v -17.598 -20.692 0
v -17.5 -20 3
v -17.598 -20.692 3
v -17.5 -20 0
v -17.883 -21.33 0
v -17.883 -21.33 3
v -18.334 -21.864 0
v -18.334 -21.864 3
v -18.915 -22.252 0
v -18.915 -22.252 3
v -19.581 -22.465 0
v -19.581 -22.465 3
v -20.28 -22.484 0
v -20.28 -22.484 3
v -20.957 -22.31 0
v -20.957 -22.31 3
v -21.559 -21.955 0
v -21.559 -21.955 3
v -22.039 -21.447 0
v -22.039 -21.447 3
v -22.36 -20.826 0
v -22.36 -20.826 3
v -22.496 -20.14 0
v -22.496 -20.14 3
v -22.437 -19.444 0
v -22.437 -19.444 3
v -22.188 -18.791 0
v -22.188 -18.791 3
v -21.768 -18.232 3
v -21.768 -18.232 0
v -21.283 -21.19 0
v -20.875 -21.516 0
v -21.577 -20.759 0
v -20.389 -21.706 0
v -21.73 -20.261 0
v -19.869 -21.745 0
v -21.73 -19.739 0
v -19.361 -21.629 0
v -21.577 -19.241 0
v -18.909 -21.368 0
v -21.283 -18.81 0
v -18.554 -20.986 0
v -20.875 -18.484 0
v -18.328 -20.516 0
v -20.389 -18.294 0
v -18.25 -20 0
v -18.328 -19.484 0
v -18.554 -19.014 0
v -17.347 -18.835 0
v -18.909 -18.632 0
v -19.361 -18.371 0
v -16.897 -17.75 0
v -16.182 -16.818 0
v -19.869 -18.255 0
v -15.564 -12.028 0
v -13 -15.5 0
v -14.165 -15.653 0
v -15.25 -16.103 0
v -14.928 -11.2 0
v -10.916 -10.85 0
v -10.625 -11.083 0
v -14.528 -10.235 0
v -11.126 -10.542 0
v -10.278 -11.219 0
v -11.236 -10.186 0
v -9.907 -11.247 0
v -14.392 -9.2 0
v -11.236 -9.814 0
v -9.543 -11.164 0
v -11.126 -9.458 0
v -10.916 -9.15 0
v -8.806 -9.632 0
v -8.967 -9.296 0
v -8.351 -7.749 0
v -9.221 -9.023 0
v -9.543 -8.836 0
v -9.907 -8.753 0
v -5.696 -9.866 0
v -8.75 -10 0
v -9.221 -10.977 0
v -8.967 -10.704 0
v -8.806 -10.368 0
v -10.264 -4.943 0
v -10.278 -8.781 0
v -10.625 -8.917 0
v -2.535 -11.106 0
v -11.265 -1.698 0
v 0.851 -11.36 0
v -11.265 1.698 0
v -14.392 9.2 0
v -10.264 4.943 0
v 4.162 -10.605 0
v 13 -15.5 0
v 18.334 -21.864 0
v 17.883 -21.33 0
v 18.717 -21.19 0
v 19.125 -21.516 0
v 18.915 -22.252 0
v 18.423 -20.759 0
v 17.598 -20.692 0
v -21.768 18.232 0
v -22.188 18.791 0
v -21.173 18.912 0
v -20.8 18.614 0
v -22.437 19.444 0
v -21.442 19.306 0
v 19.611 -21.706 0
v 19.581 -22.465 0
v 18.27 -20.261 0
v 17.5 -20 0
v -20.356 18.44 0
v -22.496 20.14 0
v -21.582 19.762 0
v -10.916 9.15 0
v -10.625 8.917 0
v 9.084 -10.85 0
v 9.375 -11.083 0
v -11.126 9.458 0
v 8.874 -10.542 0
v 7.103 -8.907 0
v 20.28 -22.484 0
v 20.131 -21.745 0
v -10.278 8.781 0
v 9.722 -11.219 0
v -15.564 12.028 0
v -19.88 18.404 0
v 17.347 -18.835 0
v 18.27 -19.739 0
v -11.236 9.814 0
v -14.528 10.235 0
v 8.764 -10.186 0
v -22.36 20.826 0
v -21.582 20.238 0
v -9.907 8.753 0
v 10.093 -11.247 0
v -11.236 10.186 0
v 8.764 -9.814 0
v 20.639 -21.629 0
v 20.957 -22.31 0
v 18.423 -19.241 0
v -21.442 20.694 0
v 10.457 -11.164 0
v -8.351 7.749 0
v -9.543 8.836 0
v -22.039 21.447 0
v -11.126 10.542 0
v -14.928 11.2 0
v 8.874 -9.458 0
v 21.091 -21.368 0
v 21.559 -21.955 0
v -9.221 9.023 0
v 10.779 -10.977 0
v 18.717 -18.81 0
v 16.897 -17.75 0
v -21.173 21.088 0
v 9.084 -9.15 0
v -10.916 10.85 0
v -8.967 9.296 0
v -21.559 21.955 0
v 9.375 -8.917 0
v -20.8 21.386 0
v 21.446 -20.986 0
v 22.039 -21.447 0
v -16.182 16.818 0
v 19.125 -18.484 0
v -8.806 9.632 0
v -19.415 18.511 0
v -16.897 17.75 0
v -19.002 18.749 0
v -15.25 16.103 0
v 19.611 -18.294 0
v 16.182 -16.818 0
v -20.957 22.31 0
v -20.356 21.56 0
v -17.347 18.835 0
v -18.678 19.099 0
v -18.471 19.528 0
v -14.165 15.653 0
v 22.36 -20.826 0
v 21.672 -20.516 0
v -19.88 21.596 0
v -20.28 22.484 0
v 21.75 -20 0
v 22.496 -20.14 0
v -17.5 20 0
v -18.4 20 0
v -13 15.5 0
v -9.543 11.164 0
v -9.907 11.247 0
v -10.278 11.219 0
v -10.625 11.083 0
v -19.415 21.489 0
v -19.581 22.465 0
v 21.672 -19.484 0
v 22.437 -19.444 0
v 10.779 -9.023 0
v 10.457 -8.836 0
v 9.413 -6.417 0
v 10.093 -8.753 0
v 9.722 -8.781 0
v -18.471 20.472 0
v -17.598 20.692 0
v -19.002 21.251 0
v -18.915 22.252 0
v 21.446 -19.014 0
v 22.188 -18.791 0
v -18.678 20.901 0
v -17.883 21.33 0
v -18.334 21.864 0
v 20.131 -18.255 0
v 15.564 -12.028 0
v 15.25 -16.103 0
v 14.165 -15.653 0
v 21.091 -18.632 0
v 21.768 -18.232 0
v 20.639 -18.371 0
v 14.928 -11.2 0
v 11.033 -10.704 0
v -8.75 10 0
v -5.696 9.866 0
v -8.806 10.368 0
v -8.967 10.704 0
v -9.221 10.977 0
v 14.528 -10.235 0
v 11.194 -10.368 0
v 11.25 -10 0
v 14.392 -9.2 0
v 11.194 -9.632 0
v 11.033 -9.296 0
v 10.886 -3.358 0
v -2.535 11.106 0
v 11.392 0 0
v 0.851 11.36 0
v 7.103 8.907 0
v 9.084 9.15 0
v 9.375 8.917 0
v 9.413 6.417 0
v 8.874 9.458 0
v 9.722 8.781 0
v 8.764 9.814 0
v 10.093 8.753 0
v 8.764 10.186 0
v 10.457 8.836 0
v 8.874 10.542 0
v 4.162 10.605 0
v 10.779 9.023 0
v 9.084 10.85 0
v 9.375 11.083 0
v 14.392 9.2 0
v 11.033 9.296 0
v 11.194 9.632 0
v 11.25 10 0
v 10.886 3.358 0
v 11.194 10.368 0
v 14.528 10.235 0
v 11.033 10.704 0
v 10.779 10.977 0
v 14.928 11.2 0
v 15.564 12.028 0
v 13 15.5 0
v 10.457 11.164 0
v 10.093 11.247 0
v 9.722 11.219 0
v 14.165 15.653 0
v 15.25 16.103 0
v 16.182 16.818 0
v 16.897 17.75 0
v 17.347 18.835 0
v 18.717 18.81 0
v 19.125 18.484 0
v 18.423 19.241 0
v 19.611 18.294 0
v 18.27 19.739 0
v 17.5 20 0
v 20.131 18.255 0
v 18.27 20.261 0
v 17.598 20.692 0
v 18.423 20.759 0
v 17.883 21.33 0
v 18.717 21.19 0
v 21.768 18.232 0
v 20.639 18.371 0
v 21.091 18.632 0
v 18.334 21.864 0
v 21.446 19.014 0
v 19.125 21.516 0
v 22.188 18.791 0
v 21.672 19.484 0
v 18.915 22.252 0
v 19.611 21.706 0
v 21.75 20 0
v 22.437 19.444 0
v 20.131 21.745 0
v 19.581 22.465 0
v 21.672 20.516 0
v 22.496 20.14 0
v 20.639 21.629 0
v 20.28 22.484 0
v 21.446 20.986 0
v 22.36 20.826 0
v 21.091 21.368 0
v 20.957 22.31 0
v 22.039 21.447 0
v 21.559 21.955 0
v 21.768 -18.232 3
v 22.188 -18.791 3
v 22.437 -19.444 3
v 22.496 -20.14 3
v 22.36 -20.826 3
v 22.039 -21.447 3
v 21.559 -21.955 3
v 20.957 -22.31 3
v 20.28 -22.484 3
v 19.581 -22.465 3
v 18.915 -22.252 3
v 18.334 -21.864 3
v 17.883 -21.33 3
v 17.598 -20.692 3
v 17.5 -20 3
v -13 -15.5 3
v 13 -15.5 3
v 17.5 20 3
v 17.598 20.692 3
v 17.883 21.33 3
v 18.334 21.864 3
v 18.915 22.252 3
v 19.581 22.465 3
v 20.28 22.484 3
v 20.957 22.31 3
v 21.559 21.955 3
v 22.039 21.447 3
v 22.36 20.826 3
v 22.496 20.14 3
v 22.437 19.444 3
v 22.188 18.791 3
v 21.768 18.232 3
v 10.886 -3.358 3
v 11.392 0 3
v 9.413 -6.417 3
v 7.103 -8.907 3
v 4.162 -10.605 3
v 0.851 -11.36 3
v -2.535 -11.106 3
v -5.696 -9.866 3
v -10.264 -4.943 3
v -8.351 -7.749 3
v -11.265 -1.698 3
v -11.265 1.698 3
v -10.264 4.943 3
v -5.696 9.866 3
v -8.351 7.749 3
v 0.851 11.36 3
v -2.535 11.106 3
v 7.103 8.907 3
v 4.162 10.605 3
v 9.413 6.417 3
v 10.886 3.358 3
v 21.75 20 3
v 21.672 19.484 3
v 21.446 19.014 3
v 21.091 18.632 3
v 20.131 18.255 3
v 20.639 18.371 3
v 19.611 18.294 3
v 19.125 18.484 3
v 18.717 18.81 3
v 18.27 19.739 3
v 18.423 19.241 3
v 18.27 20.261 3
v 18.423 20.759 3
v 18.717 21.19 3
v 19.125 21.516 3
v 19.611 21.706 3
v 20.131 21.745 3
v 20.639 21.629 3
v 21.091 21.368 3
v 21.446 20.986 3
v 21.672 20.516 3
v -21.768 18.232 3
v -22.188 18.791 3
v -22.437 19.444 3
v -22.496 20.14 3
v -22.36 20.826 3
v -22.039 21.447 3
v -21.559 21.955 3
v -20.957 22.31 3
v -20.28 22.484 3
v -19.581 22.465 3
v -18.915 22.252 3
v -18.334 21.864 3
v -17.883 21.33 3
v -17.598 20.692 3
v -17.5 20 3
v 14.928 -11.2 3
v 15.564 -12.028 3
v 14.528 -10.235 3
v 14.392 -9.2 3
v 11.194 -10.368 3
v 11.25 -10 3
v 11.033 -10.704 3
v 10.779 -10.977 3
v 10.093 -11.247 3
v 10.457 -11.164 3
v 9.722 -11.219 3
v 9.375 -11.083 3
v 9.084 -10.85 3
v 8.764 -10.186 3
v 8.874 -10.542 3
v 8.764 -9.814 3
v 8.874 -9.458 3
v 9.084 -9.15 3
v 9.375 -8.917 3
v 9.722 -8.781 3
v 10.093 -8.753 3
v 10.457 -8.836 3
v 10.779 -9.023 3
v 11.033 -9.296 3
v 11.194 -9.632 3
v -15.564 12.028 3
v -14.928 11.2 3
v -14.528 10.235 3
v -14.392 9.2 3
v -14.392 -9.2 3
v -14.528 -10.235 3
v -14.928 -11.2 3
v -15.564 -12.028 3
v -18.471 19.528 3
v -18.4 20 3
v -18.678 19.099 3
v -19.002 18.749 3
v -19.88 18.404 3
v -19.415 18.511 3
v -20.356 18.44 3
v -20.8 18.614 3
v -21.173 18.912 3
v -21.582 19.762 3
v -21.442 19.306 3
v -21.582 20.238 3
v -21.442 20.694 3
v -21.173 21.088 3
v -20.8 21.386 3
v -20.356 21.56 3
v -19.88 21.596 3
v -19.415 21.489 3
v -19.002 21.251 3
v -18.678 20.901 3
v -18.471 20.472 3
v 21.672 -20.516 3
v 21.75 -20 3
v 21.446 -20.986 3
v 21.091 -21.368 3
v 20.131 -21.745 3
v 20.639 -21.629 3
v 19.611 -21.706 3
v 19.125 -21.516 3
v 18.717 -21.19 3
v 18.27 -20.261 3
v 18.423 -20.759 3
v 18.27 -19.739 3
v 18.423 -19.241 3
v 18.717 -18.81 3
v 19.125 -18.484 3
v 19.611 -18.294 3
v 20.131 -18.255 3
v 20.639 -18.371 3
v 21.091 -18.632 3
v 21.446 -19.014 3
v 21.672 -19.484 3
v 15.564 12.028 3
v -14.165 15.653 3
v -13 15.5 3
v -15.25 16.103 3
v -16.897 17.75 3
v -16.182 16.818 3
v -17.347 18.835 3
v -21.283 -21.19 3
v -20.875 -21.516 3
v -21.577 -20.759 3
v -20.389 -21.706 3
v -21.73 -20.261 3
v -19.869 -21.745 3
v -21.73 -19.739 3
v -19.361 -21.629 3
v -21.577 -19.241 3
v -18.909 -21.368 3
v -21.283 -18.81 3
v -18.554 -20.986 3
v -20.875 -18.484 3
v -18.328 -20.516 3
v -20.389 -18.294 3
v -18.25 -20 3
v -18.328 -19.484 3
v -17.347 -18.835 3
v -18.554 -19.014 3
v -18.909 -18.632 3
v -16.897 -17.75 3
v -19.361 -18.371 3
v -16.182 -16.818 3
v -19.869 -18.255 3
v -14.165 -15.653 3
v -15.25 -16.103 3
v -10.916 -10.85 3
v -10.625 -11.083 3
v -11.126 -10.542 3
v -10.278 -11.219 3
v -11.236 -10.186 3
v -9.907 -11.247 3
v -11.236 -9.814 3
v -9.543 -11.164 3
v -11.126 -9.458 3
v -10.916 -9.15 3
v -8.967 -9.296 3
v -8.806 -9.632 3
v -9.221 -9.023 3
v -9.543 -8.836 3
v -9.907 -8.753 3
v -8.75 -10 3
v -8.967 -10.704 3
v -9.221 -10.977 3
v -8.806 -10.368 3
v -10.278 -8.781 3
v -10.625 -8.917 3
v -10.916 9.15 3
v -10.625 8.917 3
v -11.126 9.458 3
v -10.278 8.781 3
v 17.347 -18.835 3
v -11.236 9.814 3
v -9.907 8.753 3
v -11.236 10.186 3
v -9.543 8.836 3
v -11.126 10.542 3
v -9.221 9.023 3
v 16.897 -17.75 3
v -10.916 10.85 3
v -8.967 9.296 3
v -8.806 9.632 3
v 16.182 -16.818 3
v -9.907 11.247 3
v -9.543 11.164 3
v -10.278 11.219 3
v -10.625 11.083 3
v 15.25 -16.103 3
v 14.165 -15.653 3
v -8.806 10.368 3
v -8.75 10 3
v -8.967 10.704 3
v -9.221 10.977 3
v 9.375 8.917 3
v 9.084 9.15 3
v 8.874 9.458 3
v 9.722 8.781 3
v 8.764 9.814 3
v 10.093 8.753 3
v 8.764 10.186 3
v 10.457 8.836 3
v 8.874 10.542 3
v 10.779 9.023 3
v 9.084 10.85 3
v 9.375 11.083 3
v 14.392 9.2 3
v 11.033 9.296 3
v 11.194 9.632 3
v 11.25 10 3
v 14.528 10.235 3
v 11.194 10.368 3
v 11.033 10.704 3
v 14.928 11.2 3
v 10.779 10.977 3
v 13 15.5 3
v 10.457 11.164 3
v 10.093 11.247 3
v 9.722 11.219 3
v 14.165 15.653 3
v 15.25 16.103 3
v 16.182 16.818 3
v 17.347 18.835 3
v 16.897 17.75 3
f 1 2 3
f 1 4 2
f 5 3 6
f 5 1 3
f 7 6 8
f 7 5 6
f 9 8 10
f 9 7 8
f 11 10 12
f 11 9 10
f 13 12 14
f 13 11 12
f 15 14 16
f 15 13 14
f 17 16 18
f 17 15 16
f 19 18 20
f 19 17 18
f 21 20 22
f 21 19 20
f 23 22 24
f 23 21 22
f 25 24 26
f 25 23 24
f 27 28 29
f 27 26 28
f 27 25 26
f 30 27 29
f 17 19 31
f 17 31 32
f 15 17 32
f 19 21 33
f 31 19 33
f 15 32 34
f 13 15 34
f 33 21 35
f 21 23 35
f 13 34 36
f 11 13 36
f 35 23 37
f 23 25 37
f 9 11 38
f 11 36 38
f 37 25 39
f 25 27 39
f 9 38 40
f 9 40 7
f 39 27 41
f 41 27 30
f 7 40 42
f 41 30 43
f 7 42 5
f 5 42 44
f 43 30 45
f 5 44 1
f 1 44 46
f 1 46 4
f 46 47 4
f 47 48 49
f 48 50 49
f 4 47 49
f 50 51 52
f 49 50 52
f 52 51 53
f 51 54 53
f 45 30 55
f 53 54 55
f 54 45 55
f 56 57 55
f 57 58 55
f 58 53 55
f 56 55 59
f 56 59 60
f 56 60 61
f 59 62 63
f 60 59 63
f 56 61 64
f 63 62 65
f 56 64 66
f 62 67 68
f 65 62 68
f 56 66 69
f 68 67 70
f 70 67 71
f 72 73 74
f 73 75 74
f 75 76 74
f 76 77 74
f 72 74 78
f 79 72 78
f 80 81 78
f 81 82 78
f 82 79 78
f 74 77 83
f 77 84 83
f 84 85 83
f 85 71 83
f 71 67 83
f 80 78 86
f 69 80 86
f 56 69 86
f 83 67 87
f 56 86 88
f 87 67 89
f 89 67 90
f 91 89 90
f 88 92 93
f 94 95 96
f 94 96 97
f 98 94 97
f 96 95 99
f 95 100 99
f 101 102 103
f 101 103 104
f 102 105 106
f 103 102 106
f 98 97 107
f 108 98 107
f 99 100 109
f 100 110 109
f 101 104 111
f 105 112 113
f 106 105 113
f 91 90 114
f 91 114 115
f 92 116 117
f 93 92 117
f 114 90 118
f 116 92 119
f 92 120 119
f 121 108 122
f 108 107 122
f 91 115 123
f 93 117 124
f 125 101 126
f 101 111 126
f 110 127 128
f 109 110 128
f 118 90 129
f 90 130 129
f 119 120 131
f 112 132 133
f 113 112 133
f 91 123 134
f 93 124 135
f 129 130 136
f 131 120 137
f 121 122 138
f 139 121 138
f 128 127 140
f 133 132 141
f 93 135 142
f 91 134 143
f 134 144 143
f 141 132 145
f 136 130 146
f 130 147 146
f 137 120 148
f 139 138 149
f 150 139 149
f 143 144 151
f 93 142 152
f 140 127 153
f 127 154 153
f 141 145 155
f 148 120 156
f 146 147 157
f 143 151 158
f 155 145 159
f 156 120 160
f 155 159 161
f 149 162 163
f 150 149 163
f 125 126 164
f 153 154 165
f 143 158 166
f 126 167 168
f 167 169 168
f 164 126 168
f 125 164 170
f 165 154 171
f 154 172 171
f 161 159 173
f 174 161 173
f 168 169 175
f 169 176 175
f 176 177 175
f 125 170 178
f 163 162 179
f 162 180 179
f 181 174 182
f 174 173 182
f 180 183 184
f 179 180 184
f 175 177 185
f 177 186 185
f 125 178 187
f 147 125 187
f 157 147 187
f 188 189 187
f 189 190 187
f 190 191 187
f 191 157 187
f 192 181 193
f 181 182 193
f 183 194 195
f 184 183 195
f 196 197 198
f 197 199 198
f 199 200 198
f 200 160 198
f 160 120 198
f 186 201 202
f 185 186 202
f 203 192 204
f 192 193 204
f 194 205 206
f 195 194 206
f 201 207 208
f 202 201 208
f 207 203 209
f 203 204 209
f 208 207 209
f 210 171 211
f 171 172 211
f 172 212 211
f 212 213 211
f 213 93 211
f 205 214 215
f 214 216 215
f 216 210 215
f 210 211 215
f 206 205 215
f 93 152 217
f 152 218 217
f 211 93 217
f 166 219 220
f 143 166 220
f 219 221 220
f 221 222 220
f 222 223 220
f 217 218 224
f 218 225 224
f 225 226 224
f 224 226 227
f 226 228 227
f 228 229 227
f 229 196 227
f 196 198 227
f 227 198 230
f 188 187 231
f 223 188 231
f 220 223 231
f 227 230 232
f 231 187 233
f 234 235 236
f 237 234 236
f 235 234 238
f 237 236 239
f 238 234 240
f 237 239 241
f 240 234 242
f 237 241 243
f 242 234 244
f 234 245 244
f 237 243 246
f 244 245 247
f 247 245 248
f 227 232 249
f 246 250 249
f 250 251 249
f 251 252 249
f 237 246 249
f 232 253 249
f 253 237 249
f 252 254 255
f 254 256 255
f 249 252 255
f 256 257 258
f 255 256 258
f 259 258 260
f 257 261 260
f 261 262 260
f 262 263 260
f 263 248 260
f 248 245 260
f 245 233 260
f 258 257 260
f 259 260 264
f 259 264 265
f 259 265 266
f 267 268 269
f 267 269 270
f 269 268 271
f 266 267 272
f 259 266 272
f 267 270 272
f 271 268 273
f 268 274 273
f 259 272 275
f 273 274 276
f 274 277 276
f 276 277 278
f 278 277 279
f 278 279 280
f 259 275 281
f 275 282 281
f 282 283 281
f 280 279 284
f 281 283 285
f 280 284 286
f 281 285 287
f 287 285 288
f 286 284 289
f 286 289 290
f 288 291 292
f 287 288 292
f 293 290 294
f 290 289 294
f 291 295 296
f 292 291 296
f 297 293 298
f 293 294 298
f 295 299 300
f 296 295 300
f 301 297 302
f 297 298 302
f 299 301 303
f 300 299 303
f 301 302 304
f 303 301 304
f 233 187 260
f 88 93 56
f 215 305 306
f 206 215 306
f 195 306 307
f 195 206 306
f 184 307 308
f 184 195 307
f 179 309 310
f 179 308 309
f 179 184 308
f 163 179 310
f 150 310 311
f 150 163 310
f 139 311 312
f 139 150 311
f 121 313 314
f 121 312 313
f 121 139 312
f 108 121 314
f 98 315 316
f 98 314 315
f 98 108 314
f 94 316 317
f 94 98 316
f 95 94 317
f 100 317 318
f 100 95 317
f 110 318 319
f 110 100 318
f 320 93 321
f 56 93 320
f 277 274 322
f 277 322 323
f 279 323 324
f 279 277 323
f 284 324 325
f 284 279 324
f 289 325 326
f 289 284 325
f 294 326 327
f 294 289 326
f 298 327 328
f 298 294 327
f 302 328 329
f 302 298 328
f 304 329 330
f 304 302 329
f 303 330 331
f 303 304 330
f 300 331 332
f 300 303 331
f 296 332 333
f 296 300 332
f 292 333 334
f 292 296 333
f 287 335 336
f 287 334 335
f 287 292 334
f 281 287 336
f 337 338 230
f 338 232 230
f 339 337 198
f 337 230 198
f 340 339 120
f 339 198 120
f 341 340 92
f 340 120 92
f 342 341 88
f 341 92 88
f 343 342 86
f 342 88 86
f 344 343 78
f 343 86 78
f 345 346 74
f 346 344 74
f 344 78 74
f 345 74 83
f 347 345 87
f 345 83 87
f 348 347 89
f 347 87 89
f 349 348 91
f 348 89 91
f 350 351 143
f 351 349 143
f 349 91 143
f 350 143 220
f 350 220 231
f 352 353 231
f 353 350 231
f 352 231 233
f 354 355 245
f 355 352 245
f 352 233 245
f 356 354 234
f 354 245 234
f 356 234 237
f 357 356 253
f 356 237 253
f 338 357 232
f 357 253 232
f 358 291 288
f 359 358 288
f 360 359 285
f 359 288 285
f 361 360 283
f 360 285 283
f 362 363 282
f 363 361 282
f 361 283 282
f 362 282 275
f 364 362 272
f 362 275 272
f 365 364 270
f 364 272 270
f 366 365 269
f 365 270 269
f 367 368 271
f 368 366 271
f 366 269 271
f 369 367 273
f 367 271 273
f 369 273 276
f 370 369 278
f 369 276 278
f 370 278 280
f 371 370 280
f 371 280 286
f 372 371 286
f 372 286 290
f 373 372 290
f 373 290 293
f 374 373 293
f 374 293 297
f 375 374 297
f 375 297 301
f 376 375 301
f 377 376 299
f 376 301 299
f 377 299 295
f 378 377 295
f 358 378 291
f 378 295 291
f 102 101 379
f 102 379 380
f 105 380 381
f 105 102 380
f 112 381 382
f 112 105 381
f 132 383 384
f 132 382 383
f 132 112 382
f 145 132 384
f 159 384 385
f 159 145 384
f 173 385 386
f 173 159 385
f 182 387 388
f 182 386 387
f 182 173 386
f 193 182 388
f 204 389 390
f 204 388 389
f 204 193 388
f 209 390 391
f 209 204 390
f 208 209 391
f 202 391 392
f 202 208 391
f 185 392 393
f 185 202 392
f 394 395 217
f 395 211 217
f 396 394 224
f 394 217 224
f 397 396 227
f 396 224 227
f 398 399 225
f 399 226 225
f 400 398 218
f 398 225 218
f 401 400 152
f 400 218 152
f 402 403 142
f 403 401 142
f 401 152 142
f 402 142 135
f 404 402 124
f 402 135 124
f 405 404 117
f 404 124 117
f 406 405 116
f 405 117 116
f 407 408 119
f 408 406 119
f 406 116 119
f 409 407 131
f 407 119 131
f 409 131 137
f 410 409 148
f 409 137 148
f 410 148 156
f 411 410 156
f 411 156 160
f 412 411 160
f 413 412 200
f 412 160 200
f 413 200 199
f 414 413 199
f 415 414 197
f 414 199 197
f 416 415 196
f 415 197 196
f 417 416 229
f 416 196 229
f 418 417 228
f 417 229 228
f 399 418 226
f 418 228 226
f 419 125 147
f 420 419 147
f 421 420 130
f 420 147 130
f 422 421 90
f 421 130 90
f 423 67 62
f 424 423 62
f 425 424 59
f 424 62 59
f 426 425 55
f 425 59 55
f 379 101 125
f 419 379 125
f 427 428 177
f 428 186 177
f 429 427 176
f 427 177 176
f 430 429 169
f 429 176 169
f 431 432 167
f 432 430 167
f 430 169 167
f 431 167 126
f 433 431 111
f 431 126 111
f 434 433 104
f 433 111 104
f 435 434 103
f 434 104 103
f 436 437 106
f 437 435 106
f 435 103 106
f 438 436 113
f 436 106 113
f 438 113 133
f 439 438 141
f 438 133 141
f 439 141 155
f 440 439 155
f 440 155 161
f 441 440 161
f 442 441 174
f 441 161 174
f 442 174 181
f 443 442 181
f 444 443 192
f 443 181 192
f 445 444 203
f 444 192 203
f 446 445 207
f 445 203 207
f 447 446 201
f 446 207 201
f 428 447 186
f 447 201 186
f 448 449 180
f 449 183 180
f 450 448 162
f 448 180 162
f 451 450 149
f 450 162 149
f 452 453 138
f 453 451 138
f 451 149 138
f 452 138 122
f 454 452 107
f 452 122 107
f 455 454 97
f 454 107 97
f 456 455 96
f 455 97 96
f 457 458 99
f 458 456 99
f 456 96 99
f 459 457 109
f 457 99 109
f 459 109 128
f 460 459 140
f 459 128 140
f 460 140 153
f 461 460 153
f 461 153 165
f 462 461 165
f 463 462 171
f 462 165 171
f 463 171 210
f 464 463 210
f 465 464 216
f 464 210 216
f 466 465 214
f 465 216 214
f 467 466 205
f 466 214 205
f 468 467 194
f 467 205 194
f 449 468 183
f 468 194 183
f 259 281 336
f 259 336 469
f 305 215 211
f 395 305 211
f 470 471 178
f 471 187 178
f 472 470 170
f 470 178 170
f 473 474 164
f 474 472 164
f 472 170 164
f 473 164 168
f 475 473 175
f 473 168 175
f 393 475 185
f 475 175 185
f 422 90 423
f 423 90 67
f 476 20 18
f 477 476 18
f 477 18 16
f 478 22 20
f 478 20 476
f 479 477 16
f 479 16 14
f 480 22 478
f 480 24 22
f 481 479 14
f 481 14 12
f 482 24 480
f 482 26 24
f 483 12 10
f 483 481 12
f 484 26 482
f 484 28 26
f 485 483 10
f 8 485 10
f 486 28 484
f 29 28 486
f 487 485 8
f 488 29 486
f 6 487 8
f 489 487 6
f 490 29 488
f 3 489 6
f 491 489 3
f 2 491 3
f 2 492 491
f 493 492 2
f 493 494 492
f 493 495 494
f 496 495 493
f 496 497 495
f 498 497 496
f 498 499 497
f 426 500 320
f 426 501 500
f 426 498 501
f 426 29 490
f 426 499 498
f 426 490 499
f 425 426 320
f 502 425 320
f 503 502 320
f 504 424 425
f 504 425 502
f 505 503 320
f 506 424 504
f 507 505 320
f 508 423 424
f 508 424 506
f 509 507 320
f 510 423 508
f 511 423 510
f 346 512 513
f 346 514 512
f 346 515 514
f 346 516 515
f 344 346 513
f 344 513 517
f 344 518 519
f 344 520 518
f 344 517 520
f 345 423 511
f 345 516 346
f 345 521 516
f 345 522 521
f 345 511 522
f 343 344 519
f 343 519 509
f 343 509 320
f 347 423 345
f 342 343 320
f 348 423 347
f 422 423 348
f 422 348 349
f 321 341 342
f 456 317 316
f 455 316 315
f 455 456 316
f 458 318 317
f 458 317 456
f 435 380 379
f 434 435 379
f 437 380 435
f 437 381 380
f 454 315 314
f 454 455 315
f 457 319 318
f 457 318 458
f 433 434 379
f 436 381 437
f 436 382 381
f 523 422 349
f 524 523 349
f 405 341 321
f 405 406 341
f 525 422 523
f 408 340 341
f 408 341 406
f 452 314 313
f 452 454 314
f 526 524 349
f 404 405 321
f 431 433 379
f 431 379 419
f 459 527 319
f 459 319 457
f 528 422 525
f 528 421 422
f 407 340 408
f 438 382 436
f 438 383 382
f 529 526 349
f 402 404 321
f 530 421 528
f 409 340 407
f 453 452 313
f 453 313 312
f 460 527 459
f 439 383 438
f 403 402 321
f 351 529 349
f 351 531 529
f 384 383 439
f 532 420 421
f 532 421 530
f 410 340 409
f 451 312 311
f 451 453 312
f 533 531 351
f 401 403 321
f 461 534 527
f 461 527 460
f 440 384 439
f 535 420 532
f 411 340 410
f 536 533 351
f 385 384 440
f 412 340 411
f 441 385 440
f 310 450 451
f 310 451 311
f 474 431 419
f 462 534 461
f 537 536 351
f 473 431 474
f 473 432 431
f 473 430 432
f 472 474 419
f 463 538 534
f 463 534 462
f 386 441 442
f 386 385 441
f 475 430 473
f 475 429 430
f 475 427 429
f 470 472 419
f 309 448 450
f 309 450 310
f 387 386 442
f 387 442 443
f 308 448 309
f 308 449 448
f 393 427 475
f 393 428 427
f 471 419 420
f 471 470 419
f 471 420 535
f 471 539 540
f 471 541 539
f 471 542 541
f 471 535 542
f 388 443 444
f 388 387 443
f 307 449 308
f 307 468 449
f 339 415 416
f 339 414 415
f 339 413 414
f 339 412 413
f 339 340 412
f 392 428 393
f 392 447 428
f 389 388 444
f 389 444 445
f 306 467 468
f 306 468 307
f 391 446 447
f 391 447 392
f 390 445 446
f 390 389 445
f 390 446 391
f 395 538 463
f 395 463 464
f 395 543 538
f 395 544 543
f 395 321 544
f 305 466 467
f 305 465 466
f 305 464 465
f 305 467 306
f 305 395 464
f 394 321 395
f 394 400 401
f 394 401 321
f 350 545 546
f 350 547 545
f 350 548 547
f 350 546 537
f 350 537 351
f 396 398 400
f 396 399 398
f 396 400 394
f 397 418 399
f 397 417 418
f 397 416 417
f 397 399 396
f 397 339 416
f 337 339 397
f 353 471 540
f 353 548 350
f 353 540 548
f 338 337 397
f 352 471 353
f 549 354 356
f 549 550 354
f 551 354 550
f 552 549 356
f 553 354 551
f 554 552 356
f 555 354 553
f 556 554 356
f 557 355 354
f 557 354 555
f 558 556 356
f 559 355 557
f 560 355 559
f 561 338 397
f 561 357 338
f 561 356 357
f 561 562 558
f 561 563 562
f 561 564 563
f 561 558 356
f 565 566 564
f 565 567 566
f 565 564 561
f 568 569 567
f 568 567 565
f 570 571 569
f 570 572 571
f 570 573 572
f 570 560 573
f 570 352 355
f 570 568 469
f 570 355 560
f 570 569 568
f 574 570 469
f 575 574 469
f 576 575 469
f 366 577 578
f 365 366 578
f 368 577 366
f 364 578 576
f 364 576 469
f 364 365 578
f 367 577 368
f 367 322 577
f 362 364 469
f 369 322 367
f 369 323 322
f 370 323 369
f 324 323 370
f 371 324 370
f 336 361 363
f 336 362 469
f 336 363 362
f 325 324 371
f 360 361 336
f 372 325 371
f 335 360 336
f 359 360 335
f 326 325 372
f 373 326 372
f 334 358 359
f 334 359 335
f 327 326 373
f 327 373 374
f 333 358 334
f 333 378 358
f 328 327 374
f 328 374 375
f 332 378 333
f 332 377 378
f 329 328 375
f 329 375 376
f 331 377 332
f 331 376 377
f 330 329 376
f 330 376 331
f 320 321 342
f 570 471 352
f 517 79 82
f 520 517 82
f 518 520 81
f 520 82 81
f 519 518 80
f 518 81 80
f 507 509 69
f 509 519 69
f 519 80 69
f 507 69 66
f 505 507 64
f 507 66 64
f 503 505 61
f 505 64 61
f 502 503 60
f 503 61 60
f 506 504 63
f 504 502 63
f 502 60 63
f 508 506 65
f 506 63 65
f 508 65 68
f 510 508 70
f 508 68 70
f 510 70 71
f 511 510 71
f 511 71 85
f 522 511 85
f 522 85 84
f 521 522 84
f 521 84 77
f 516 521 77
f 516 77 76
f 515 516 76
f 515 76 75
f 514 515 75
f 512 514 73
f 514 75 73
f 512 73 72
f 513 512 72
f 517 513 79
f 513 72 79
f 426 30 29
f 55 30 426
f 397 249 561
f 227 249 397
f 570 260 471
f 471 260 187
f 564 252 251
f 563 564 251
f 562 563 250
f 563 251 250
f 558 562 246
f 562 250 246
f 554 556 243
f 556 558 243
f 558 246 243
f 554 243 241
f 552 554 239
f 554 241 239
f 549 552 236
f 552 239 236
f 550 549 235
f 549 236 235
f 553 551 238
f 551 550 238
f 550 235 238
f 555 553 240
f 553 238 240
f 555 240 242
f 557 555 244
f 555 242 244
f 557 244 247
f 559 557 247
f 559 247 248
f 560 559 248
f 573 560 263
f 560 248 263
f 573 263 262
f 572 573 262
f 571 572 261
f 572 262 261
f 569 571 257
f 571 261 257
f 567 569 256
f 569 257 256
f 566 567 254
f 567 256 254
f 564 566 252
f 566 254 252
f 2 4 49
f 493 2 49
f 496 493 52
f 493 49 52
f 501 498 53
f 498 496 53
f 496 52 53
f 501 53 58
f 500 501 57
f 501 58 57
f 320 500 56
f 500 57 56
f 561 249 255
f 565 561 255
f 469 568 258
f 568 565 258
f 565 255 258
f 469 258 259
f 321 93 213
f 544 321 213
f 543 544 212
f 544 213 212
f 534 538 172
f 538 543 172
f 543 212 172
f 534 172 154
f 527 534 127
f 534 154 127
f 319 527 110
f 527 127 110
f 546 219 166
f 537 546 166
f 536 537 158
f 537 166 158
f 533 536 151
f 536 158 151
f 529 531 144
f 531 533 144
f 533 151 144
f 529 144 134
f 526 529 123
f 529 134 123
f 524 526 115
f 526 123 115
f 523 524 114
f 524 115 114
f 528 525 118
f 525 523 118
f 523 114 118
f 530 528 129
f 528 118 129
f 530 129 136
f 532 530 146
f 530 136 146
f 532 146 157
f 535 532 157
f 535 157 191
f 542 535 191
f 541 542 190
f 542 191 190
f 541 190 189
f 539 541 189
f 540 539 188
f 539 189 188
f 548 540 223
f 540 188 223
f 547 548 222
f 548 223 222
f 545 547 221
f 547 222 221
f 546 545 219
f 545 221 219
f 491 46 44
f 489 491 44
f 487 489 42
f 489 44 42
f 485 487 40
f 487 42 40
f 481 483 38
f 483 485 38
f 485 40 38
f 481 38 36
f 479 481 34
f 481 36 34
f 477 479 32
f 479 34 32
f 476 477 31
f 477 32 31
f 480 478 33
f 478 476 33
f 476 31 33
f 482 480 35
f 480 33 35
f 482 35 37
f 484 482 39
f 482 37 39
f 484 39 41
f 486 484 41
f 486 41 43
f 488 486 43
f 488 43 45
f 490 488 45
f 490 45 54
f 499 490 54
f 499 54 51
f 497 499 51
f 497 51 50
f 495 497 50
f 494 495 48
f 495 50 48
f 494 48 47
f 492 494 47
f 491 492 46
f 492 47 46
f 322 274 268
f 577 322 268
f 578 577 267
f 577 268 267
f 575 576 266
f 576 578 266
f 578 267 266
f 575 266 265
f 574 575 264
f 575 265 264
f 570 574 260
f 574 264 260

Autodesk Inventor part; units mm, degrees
ref_plane "YZ Plane" through (0, 0, 0) normal (1, 0, 0) x (0, 1, 0)
ref_plane "XZ Plane" through (0, 0, 0) normal (0, 1, 0) x (-1, 0, 0)
ref_plane "XY Plane" through (0, 0, 0) normal (0, 0, 1) x (1, 0, 0)
sketch "スケッチ1" plane through (0, 0, 0) normal (0, 0, 1) x (1, 0, 0)
  line L0 (10, -10) -> (-10, -10) construction
  line L1 (-10, -10) -> (-10, 10) construction
  line L2 (-10, 10) -> (10, 10) construction
  line L3 (10, 10) -> (10, -10) construction
  line L4 (10, -10) -> (-10, 10) construction
  line L5 (-10, -10) -> (10, 10) construction
  line L6 (12.5, -12.5) -> (-12.5, -12.5) construction
  line L7 (-12.5, -12.5) -> (-12.5, 12.5) construction
  line L8 (-12.5, 12.5) -> (12.5, 12.5) construction
  line L9 (12.5, 12.5) -> (12.5, -12.5) construction
  line L10 (12.5, -12.5) -> (-12.5, 12.5) construction
  line L11 (-12.5, -12.5) -> (12.5, 12.5) construction
  circle A0 centre (10, 10) radius 1.25
  circle A1 centre (-10, 10) radius 1.25
  circle A2 centre (10, -10) radius 1.25
  circle A3 centre (-10, -10) radius 1.25
  circle A4 centre (20, 20) radius 1.75
  line L12 (20, -20) -> (-20, -20) construction
  line L13 (-20, -20) -> (-20, 20) construction
  line L14 (-20, 20) -> (20, 20) construction
  line L15 (20, 20) -> (20, -20) construction
  line L16 (20, -20) -> (-20, 20) construction
  line L17 (-20, -20) -> (20, 20) construction
  circle A5 centre (-20, 20) radius 1.6
  circle A6 centre (20, -20) radius 1.75
  circle A7 centre (-20, -20) radius 1.75
  arc A8 (21.7678, 18.2322) -> (17.5, 20) centre (20, 20) ccw
  line L18 (17.5, 20) -> (17.5, 20)
  line L19 (13, 15.5) -> (-13, 15.5)
  circle A9 centre (0, 0) radius 11.3921
  arc A10 (13, 15.5) -> (17.5, 20) centre (13, 20) ccw
  line L20 (21.7678, 18.2322) -> (15.5637, 12.0282)
  line L21 (14.3921, 9.1997) -> (14.3921, -9.1997)
  arc A11 (15.5637, 12.0282) -> (14.3921, 9.1997) centre (18.3921, 9.1997) ccw
  line L22 (20, 0) -> (-20, 0) construction
  line L23 (0, 20) -> (0, -20) construction
  arc A12 (17.5, -20) -> (21.7678, -18.2322) centre (20, -20) ccw
  line L24 (17.5, -20) -> (17.5, -20)
  line L25 (13, -15.5) -> (-13, -15.5)
  arc A13 (17.5, -20) -> (13, -15.5) centre (13, -20) ccw
  line L26 (21.7678, -18.2322) -> (15.5637, -12.0282)
  arc A14 (14.3921, -9.1997) -> (15.5637, -12.0282) centre (18.3921, -9.1997) ccw
  circle A15 centre (10, 10) radius 2.75 construction
  arc A16 (-17.5, 20) -> (-21.7678, 18.2322) centre (-20, 20) ccw
  arc A17 (-17.5, 20) -> (-13, 15.5) centre (-13, 20) ccw
  line L27 (-21.7678, 18.2322) -> (-15.5637, 12.0282)
  line L28 (-14.3921, 9.1997) -> (-14.3921, -9.1997)
  arc A18 (-14.3921, 9.1997) -> (-15.5637, 12.0282) centre (-18.3921, 9.1997) ccw
  arc A19 (-15.5637, -12.0282) -> (-14.3921, -9.1997) centre (-18.3921, -9.1997) ccw
  line L29 (-21.7678, -18.2322) -> (-15.5637, -12.0282)
  arc A20 (-21.7678, -18.2322) -> (-17.5, -20) centre (-20, -20) ccw
  line L30 (-17.5, -20) -> (-17.5, -20)
  arc A21 (-13, -15.5) -> (-17.5, -20) centre (-13, -20) ccw
  line L31 (-17.5, 20) -> (-17.5, 20)
  dimension "d0" = 20
  dimension "d1" = 20
  dimension "d2" = 25
  dimension "d3" = 25
  dimension "d4" = 2.5
  dimension "d5" = 2.5
  dimension "d6" = 2.5
  dimension "d7" = 2.5
  dimension "d8" = 3.5
  dimension "d9" = 40
  dimension "d10" = 40
  dimension "d11" = 3.2
  dimension "d12" = 3.5
  dimension "d13" = 3.5
  dimension "d14" = 2.5
  dimension "d18" = 4
  dimension "d19" = 3
  dimension "d20" = 45
  dimension "d21" = 5.5
  dimension "d22" = 3
extrude "押し出し1" add sketch "スケッチ1" along normal blind 3
equation "\"d1\" = d0"
equation "\"d3\" = d2"
equation "\"d5\" = d4"
equation "\"d6\" = d4"
equation "\"d7\" = d4"
equation "\"d22\" = d19"
properties part number "Fan_support_stand"
